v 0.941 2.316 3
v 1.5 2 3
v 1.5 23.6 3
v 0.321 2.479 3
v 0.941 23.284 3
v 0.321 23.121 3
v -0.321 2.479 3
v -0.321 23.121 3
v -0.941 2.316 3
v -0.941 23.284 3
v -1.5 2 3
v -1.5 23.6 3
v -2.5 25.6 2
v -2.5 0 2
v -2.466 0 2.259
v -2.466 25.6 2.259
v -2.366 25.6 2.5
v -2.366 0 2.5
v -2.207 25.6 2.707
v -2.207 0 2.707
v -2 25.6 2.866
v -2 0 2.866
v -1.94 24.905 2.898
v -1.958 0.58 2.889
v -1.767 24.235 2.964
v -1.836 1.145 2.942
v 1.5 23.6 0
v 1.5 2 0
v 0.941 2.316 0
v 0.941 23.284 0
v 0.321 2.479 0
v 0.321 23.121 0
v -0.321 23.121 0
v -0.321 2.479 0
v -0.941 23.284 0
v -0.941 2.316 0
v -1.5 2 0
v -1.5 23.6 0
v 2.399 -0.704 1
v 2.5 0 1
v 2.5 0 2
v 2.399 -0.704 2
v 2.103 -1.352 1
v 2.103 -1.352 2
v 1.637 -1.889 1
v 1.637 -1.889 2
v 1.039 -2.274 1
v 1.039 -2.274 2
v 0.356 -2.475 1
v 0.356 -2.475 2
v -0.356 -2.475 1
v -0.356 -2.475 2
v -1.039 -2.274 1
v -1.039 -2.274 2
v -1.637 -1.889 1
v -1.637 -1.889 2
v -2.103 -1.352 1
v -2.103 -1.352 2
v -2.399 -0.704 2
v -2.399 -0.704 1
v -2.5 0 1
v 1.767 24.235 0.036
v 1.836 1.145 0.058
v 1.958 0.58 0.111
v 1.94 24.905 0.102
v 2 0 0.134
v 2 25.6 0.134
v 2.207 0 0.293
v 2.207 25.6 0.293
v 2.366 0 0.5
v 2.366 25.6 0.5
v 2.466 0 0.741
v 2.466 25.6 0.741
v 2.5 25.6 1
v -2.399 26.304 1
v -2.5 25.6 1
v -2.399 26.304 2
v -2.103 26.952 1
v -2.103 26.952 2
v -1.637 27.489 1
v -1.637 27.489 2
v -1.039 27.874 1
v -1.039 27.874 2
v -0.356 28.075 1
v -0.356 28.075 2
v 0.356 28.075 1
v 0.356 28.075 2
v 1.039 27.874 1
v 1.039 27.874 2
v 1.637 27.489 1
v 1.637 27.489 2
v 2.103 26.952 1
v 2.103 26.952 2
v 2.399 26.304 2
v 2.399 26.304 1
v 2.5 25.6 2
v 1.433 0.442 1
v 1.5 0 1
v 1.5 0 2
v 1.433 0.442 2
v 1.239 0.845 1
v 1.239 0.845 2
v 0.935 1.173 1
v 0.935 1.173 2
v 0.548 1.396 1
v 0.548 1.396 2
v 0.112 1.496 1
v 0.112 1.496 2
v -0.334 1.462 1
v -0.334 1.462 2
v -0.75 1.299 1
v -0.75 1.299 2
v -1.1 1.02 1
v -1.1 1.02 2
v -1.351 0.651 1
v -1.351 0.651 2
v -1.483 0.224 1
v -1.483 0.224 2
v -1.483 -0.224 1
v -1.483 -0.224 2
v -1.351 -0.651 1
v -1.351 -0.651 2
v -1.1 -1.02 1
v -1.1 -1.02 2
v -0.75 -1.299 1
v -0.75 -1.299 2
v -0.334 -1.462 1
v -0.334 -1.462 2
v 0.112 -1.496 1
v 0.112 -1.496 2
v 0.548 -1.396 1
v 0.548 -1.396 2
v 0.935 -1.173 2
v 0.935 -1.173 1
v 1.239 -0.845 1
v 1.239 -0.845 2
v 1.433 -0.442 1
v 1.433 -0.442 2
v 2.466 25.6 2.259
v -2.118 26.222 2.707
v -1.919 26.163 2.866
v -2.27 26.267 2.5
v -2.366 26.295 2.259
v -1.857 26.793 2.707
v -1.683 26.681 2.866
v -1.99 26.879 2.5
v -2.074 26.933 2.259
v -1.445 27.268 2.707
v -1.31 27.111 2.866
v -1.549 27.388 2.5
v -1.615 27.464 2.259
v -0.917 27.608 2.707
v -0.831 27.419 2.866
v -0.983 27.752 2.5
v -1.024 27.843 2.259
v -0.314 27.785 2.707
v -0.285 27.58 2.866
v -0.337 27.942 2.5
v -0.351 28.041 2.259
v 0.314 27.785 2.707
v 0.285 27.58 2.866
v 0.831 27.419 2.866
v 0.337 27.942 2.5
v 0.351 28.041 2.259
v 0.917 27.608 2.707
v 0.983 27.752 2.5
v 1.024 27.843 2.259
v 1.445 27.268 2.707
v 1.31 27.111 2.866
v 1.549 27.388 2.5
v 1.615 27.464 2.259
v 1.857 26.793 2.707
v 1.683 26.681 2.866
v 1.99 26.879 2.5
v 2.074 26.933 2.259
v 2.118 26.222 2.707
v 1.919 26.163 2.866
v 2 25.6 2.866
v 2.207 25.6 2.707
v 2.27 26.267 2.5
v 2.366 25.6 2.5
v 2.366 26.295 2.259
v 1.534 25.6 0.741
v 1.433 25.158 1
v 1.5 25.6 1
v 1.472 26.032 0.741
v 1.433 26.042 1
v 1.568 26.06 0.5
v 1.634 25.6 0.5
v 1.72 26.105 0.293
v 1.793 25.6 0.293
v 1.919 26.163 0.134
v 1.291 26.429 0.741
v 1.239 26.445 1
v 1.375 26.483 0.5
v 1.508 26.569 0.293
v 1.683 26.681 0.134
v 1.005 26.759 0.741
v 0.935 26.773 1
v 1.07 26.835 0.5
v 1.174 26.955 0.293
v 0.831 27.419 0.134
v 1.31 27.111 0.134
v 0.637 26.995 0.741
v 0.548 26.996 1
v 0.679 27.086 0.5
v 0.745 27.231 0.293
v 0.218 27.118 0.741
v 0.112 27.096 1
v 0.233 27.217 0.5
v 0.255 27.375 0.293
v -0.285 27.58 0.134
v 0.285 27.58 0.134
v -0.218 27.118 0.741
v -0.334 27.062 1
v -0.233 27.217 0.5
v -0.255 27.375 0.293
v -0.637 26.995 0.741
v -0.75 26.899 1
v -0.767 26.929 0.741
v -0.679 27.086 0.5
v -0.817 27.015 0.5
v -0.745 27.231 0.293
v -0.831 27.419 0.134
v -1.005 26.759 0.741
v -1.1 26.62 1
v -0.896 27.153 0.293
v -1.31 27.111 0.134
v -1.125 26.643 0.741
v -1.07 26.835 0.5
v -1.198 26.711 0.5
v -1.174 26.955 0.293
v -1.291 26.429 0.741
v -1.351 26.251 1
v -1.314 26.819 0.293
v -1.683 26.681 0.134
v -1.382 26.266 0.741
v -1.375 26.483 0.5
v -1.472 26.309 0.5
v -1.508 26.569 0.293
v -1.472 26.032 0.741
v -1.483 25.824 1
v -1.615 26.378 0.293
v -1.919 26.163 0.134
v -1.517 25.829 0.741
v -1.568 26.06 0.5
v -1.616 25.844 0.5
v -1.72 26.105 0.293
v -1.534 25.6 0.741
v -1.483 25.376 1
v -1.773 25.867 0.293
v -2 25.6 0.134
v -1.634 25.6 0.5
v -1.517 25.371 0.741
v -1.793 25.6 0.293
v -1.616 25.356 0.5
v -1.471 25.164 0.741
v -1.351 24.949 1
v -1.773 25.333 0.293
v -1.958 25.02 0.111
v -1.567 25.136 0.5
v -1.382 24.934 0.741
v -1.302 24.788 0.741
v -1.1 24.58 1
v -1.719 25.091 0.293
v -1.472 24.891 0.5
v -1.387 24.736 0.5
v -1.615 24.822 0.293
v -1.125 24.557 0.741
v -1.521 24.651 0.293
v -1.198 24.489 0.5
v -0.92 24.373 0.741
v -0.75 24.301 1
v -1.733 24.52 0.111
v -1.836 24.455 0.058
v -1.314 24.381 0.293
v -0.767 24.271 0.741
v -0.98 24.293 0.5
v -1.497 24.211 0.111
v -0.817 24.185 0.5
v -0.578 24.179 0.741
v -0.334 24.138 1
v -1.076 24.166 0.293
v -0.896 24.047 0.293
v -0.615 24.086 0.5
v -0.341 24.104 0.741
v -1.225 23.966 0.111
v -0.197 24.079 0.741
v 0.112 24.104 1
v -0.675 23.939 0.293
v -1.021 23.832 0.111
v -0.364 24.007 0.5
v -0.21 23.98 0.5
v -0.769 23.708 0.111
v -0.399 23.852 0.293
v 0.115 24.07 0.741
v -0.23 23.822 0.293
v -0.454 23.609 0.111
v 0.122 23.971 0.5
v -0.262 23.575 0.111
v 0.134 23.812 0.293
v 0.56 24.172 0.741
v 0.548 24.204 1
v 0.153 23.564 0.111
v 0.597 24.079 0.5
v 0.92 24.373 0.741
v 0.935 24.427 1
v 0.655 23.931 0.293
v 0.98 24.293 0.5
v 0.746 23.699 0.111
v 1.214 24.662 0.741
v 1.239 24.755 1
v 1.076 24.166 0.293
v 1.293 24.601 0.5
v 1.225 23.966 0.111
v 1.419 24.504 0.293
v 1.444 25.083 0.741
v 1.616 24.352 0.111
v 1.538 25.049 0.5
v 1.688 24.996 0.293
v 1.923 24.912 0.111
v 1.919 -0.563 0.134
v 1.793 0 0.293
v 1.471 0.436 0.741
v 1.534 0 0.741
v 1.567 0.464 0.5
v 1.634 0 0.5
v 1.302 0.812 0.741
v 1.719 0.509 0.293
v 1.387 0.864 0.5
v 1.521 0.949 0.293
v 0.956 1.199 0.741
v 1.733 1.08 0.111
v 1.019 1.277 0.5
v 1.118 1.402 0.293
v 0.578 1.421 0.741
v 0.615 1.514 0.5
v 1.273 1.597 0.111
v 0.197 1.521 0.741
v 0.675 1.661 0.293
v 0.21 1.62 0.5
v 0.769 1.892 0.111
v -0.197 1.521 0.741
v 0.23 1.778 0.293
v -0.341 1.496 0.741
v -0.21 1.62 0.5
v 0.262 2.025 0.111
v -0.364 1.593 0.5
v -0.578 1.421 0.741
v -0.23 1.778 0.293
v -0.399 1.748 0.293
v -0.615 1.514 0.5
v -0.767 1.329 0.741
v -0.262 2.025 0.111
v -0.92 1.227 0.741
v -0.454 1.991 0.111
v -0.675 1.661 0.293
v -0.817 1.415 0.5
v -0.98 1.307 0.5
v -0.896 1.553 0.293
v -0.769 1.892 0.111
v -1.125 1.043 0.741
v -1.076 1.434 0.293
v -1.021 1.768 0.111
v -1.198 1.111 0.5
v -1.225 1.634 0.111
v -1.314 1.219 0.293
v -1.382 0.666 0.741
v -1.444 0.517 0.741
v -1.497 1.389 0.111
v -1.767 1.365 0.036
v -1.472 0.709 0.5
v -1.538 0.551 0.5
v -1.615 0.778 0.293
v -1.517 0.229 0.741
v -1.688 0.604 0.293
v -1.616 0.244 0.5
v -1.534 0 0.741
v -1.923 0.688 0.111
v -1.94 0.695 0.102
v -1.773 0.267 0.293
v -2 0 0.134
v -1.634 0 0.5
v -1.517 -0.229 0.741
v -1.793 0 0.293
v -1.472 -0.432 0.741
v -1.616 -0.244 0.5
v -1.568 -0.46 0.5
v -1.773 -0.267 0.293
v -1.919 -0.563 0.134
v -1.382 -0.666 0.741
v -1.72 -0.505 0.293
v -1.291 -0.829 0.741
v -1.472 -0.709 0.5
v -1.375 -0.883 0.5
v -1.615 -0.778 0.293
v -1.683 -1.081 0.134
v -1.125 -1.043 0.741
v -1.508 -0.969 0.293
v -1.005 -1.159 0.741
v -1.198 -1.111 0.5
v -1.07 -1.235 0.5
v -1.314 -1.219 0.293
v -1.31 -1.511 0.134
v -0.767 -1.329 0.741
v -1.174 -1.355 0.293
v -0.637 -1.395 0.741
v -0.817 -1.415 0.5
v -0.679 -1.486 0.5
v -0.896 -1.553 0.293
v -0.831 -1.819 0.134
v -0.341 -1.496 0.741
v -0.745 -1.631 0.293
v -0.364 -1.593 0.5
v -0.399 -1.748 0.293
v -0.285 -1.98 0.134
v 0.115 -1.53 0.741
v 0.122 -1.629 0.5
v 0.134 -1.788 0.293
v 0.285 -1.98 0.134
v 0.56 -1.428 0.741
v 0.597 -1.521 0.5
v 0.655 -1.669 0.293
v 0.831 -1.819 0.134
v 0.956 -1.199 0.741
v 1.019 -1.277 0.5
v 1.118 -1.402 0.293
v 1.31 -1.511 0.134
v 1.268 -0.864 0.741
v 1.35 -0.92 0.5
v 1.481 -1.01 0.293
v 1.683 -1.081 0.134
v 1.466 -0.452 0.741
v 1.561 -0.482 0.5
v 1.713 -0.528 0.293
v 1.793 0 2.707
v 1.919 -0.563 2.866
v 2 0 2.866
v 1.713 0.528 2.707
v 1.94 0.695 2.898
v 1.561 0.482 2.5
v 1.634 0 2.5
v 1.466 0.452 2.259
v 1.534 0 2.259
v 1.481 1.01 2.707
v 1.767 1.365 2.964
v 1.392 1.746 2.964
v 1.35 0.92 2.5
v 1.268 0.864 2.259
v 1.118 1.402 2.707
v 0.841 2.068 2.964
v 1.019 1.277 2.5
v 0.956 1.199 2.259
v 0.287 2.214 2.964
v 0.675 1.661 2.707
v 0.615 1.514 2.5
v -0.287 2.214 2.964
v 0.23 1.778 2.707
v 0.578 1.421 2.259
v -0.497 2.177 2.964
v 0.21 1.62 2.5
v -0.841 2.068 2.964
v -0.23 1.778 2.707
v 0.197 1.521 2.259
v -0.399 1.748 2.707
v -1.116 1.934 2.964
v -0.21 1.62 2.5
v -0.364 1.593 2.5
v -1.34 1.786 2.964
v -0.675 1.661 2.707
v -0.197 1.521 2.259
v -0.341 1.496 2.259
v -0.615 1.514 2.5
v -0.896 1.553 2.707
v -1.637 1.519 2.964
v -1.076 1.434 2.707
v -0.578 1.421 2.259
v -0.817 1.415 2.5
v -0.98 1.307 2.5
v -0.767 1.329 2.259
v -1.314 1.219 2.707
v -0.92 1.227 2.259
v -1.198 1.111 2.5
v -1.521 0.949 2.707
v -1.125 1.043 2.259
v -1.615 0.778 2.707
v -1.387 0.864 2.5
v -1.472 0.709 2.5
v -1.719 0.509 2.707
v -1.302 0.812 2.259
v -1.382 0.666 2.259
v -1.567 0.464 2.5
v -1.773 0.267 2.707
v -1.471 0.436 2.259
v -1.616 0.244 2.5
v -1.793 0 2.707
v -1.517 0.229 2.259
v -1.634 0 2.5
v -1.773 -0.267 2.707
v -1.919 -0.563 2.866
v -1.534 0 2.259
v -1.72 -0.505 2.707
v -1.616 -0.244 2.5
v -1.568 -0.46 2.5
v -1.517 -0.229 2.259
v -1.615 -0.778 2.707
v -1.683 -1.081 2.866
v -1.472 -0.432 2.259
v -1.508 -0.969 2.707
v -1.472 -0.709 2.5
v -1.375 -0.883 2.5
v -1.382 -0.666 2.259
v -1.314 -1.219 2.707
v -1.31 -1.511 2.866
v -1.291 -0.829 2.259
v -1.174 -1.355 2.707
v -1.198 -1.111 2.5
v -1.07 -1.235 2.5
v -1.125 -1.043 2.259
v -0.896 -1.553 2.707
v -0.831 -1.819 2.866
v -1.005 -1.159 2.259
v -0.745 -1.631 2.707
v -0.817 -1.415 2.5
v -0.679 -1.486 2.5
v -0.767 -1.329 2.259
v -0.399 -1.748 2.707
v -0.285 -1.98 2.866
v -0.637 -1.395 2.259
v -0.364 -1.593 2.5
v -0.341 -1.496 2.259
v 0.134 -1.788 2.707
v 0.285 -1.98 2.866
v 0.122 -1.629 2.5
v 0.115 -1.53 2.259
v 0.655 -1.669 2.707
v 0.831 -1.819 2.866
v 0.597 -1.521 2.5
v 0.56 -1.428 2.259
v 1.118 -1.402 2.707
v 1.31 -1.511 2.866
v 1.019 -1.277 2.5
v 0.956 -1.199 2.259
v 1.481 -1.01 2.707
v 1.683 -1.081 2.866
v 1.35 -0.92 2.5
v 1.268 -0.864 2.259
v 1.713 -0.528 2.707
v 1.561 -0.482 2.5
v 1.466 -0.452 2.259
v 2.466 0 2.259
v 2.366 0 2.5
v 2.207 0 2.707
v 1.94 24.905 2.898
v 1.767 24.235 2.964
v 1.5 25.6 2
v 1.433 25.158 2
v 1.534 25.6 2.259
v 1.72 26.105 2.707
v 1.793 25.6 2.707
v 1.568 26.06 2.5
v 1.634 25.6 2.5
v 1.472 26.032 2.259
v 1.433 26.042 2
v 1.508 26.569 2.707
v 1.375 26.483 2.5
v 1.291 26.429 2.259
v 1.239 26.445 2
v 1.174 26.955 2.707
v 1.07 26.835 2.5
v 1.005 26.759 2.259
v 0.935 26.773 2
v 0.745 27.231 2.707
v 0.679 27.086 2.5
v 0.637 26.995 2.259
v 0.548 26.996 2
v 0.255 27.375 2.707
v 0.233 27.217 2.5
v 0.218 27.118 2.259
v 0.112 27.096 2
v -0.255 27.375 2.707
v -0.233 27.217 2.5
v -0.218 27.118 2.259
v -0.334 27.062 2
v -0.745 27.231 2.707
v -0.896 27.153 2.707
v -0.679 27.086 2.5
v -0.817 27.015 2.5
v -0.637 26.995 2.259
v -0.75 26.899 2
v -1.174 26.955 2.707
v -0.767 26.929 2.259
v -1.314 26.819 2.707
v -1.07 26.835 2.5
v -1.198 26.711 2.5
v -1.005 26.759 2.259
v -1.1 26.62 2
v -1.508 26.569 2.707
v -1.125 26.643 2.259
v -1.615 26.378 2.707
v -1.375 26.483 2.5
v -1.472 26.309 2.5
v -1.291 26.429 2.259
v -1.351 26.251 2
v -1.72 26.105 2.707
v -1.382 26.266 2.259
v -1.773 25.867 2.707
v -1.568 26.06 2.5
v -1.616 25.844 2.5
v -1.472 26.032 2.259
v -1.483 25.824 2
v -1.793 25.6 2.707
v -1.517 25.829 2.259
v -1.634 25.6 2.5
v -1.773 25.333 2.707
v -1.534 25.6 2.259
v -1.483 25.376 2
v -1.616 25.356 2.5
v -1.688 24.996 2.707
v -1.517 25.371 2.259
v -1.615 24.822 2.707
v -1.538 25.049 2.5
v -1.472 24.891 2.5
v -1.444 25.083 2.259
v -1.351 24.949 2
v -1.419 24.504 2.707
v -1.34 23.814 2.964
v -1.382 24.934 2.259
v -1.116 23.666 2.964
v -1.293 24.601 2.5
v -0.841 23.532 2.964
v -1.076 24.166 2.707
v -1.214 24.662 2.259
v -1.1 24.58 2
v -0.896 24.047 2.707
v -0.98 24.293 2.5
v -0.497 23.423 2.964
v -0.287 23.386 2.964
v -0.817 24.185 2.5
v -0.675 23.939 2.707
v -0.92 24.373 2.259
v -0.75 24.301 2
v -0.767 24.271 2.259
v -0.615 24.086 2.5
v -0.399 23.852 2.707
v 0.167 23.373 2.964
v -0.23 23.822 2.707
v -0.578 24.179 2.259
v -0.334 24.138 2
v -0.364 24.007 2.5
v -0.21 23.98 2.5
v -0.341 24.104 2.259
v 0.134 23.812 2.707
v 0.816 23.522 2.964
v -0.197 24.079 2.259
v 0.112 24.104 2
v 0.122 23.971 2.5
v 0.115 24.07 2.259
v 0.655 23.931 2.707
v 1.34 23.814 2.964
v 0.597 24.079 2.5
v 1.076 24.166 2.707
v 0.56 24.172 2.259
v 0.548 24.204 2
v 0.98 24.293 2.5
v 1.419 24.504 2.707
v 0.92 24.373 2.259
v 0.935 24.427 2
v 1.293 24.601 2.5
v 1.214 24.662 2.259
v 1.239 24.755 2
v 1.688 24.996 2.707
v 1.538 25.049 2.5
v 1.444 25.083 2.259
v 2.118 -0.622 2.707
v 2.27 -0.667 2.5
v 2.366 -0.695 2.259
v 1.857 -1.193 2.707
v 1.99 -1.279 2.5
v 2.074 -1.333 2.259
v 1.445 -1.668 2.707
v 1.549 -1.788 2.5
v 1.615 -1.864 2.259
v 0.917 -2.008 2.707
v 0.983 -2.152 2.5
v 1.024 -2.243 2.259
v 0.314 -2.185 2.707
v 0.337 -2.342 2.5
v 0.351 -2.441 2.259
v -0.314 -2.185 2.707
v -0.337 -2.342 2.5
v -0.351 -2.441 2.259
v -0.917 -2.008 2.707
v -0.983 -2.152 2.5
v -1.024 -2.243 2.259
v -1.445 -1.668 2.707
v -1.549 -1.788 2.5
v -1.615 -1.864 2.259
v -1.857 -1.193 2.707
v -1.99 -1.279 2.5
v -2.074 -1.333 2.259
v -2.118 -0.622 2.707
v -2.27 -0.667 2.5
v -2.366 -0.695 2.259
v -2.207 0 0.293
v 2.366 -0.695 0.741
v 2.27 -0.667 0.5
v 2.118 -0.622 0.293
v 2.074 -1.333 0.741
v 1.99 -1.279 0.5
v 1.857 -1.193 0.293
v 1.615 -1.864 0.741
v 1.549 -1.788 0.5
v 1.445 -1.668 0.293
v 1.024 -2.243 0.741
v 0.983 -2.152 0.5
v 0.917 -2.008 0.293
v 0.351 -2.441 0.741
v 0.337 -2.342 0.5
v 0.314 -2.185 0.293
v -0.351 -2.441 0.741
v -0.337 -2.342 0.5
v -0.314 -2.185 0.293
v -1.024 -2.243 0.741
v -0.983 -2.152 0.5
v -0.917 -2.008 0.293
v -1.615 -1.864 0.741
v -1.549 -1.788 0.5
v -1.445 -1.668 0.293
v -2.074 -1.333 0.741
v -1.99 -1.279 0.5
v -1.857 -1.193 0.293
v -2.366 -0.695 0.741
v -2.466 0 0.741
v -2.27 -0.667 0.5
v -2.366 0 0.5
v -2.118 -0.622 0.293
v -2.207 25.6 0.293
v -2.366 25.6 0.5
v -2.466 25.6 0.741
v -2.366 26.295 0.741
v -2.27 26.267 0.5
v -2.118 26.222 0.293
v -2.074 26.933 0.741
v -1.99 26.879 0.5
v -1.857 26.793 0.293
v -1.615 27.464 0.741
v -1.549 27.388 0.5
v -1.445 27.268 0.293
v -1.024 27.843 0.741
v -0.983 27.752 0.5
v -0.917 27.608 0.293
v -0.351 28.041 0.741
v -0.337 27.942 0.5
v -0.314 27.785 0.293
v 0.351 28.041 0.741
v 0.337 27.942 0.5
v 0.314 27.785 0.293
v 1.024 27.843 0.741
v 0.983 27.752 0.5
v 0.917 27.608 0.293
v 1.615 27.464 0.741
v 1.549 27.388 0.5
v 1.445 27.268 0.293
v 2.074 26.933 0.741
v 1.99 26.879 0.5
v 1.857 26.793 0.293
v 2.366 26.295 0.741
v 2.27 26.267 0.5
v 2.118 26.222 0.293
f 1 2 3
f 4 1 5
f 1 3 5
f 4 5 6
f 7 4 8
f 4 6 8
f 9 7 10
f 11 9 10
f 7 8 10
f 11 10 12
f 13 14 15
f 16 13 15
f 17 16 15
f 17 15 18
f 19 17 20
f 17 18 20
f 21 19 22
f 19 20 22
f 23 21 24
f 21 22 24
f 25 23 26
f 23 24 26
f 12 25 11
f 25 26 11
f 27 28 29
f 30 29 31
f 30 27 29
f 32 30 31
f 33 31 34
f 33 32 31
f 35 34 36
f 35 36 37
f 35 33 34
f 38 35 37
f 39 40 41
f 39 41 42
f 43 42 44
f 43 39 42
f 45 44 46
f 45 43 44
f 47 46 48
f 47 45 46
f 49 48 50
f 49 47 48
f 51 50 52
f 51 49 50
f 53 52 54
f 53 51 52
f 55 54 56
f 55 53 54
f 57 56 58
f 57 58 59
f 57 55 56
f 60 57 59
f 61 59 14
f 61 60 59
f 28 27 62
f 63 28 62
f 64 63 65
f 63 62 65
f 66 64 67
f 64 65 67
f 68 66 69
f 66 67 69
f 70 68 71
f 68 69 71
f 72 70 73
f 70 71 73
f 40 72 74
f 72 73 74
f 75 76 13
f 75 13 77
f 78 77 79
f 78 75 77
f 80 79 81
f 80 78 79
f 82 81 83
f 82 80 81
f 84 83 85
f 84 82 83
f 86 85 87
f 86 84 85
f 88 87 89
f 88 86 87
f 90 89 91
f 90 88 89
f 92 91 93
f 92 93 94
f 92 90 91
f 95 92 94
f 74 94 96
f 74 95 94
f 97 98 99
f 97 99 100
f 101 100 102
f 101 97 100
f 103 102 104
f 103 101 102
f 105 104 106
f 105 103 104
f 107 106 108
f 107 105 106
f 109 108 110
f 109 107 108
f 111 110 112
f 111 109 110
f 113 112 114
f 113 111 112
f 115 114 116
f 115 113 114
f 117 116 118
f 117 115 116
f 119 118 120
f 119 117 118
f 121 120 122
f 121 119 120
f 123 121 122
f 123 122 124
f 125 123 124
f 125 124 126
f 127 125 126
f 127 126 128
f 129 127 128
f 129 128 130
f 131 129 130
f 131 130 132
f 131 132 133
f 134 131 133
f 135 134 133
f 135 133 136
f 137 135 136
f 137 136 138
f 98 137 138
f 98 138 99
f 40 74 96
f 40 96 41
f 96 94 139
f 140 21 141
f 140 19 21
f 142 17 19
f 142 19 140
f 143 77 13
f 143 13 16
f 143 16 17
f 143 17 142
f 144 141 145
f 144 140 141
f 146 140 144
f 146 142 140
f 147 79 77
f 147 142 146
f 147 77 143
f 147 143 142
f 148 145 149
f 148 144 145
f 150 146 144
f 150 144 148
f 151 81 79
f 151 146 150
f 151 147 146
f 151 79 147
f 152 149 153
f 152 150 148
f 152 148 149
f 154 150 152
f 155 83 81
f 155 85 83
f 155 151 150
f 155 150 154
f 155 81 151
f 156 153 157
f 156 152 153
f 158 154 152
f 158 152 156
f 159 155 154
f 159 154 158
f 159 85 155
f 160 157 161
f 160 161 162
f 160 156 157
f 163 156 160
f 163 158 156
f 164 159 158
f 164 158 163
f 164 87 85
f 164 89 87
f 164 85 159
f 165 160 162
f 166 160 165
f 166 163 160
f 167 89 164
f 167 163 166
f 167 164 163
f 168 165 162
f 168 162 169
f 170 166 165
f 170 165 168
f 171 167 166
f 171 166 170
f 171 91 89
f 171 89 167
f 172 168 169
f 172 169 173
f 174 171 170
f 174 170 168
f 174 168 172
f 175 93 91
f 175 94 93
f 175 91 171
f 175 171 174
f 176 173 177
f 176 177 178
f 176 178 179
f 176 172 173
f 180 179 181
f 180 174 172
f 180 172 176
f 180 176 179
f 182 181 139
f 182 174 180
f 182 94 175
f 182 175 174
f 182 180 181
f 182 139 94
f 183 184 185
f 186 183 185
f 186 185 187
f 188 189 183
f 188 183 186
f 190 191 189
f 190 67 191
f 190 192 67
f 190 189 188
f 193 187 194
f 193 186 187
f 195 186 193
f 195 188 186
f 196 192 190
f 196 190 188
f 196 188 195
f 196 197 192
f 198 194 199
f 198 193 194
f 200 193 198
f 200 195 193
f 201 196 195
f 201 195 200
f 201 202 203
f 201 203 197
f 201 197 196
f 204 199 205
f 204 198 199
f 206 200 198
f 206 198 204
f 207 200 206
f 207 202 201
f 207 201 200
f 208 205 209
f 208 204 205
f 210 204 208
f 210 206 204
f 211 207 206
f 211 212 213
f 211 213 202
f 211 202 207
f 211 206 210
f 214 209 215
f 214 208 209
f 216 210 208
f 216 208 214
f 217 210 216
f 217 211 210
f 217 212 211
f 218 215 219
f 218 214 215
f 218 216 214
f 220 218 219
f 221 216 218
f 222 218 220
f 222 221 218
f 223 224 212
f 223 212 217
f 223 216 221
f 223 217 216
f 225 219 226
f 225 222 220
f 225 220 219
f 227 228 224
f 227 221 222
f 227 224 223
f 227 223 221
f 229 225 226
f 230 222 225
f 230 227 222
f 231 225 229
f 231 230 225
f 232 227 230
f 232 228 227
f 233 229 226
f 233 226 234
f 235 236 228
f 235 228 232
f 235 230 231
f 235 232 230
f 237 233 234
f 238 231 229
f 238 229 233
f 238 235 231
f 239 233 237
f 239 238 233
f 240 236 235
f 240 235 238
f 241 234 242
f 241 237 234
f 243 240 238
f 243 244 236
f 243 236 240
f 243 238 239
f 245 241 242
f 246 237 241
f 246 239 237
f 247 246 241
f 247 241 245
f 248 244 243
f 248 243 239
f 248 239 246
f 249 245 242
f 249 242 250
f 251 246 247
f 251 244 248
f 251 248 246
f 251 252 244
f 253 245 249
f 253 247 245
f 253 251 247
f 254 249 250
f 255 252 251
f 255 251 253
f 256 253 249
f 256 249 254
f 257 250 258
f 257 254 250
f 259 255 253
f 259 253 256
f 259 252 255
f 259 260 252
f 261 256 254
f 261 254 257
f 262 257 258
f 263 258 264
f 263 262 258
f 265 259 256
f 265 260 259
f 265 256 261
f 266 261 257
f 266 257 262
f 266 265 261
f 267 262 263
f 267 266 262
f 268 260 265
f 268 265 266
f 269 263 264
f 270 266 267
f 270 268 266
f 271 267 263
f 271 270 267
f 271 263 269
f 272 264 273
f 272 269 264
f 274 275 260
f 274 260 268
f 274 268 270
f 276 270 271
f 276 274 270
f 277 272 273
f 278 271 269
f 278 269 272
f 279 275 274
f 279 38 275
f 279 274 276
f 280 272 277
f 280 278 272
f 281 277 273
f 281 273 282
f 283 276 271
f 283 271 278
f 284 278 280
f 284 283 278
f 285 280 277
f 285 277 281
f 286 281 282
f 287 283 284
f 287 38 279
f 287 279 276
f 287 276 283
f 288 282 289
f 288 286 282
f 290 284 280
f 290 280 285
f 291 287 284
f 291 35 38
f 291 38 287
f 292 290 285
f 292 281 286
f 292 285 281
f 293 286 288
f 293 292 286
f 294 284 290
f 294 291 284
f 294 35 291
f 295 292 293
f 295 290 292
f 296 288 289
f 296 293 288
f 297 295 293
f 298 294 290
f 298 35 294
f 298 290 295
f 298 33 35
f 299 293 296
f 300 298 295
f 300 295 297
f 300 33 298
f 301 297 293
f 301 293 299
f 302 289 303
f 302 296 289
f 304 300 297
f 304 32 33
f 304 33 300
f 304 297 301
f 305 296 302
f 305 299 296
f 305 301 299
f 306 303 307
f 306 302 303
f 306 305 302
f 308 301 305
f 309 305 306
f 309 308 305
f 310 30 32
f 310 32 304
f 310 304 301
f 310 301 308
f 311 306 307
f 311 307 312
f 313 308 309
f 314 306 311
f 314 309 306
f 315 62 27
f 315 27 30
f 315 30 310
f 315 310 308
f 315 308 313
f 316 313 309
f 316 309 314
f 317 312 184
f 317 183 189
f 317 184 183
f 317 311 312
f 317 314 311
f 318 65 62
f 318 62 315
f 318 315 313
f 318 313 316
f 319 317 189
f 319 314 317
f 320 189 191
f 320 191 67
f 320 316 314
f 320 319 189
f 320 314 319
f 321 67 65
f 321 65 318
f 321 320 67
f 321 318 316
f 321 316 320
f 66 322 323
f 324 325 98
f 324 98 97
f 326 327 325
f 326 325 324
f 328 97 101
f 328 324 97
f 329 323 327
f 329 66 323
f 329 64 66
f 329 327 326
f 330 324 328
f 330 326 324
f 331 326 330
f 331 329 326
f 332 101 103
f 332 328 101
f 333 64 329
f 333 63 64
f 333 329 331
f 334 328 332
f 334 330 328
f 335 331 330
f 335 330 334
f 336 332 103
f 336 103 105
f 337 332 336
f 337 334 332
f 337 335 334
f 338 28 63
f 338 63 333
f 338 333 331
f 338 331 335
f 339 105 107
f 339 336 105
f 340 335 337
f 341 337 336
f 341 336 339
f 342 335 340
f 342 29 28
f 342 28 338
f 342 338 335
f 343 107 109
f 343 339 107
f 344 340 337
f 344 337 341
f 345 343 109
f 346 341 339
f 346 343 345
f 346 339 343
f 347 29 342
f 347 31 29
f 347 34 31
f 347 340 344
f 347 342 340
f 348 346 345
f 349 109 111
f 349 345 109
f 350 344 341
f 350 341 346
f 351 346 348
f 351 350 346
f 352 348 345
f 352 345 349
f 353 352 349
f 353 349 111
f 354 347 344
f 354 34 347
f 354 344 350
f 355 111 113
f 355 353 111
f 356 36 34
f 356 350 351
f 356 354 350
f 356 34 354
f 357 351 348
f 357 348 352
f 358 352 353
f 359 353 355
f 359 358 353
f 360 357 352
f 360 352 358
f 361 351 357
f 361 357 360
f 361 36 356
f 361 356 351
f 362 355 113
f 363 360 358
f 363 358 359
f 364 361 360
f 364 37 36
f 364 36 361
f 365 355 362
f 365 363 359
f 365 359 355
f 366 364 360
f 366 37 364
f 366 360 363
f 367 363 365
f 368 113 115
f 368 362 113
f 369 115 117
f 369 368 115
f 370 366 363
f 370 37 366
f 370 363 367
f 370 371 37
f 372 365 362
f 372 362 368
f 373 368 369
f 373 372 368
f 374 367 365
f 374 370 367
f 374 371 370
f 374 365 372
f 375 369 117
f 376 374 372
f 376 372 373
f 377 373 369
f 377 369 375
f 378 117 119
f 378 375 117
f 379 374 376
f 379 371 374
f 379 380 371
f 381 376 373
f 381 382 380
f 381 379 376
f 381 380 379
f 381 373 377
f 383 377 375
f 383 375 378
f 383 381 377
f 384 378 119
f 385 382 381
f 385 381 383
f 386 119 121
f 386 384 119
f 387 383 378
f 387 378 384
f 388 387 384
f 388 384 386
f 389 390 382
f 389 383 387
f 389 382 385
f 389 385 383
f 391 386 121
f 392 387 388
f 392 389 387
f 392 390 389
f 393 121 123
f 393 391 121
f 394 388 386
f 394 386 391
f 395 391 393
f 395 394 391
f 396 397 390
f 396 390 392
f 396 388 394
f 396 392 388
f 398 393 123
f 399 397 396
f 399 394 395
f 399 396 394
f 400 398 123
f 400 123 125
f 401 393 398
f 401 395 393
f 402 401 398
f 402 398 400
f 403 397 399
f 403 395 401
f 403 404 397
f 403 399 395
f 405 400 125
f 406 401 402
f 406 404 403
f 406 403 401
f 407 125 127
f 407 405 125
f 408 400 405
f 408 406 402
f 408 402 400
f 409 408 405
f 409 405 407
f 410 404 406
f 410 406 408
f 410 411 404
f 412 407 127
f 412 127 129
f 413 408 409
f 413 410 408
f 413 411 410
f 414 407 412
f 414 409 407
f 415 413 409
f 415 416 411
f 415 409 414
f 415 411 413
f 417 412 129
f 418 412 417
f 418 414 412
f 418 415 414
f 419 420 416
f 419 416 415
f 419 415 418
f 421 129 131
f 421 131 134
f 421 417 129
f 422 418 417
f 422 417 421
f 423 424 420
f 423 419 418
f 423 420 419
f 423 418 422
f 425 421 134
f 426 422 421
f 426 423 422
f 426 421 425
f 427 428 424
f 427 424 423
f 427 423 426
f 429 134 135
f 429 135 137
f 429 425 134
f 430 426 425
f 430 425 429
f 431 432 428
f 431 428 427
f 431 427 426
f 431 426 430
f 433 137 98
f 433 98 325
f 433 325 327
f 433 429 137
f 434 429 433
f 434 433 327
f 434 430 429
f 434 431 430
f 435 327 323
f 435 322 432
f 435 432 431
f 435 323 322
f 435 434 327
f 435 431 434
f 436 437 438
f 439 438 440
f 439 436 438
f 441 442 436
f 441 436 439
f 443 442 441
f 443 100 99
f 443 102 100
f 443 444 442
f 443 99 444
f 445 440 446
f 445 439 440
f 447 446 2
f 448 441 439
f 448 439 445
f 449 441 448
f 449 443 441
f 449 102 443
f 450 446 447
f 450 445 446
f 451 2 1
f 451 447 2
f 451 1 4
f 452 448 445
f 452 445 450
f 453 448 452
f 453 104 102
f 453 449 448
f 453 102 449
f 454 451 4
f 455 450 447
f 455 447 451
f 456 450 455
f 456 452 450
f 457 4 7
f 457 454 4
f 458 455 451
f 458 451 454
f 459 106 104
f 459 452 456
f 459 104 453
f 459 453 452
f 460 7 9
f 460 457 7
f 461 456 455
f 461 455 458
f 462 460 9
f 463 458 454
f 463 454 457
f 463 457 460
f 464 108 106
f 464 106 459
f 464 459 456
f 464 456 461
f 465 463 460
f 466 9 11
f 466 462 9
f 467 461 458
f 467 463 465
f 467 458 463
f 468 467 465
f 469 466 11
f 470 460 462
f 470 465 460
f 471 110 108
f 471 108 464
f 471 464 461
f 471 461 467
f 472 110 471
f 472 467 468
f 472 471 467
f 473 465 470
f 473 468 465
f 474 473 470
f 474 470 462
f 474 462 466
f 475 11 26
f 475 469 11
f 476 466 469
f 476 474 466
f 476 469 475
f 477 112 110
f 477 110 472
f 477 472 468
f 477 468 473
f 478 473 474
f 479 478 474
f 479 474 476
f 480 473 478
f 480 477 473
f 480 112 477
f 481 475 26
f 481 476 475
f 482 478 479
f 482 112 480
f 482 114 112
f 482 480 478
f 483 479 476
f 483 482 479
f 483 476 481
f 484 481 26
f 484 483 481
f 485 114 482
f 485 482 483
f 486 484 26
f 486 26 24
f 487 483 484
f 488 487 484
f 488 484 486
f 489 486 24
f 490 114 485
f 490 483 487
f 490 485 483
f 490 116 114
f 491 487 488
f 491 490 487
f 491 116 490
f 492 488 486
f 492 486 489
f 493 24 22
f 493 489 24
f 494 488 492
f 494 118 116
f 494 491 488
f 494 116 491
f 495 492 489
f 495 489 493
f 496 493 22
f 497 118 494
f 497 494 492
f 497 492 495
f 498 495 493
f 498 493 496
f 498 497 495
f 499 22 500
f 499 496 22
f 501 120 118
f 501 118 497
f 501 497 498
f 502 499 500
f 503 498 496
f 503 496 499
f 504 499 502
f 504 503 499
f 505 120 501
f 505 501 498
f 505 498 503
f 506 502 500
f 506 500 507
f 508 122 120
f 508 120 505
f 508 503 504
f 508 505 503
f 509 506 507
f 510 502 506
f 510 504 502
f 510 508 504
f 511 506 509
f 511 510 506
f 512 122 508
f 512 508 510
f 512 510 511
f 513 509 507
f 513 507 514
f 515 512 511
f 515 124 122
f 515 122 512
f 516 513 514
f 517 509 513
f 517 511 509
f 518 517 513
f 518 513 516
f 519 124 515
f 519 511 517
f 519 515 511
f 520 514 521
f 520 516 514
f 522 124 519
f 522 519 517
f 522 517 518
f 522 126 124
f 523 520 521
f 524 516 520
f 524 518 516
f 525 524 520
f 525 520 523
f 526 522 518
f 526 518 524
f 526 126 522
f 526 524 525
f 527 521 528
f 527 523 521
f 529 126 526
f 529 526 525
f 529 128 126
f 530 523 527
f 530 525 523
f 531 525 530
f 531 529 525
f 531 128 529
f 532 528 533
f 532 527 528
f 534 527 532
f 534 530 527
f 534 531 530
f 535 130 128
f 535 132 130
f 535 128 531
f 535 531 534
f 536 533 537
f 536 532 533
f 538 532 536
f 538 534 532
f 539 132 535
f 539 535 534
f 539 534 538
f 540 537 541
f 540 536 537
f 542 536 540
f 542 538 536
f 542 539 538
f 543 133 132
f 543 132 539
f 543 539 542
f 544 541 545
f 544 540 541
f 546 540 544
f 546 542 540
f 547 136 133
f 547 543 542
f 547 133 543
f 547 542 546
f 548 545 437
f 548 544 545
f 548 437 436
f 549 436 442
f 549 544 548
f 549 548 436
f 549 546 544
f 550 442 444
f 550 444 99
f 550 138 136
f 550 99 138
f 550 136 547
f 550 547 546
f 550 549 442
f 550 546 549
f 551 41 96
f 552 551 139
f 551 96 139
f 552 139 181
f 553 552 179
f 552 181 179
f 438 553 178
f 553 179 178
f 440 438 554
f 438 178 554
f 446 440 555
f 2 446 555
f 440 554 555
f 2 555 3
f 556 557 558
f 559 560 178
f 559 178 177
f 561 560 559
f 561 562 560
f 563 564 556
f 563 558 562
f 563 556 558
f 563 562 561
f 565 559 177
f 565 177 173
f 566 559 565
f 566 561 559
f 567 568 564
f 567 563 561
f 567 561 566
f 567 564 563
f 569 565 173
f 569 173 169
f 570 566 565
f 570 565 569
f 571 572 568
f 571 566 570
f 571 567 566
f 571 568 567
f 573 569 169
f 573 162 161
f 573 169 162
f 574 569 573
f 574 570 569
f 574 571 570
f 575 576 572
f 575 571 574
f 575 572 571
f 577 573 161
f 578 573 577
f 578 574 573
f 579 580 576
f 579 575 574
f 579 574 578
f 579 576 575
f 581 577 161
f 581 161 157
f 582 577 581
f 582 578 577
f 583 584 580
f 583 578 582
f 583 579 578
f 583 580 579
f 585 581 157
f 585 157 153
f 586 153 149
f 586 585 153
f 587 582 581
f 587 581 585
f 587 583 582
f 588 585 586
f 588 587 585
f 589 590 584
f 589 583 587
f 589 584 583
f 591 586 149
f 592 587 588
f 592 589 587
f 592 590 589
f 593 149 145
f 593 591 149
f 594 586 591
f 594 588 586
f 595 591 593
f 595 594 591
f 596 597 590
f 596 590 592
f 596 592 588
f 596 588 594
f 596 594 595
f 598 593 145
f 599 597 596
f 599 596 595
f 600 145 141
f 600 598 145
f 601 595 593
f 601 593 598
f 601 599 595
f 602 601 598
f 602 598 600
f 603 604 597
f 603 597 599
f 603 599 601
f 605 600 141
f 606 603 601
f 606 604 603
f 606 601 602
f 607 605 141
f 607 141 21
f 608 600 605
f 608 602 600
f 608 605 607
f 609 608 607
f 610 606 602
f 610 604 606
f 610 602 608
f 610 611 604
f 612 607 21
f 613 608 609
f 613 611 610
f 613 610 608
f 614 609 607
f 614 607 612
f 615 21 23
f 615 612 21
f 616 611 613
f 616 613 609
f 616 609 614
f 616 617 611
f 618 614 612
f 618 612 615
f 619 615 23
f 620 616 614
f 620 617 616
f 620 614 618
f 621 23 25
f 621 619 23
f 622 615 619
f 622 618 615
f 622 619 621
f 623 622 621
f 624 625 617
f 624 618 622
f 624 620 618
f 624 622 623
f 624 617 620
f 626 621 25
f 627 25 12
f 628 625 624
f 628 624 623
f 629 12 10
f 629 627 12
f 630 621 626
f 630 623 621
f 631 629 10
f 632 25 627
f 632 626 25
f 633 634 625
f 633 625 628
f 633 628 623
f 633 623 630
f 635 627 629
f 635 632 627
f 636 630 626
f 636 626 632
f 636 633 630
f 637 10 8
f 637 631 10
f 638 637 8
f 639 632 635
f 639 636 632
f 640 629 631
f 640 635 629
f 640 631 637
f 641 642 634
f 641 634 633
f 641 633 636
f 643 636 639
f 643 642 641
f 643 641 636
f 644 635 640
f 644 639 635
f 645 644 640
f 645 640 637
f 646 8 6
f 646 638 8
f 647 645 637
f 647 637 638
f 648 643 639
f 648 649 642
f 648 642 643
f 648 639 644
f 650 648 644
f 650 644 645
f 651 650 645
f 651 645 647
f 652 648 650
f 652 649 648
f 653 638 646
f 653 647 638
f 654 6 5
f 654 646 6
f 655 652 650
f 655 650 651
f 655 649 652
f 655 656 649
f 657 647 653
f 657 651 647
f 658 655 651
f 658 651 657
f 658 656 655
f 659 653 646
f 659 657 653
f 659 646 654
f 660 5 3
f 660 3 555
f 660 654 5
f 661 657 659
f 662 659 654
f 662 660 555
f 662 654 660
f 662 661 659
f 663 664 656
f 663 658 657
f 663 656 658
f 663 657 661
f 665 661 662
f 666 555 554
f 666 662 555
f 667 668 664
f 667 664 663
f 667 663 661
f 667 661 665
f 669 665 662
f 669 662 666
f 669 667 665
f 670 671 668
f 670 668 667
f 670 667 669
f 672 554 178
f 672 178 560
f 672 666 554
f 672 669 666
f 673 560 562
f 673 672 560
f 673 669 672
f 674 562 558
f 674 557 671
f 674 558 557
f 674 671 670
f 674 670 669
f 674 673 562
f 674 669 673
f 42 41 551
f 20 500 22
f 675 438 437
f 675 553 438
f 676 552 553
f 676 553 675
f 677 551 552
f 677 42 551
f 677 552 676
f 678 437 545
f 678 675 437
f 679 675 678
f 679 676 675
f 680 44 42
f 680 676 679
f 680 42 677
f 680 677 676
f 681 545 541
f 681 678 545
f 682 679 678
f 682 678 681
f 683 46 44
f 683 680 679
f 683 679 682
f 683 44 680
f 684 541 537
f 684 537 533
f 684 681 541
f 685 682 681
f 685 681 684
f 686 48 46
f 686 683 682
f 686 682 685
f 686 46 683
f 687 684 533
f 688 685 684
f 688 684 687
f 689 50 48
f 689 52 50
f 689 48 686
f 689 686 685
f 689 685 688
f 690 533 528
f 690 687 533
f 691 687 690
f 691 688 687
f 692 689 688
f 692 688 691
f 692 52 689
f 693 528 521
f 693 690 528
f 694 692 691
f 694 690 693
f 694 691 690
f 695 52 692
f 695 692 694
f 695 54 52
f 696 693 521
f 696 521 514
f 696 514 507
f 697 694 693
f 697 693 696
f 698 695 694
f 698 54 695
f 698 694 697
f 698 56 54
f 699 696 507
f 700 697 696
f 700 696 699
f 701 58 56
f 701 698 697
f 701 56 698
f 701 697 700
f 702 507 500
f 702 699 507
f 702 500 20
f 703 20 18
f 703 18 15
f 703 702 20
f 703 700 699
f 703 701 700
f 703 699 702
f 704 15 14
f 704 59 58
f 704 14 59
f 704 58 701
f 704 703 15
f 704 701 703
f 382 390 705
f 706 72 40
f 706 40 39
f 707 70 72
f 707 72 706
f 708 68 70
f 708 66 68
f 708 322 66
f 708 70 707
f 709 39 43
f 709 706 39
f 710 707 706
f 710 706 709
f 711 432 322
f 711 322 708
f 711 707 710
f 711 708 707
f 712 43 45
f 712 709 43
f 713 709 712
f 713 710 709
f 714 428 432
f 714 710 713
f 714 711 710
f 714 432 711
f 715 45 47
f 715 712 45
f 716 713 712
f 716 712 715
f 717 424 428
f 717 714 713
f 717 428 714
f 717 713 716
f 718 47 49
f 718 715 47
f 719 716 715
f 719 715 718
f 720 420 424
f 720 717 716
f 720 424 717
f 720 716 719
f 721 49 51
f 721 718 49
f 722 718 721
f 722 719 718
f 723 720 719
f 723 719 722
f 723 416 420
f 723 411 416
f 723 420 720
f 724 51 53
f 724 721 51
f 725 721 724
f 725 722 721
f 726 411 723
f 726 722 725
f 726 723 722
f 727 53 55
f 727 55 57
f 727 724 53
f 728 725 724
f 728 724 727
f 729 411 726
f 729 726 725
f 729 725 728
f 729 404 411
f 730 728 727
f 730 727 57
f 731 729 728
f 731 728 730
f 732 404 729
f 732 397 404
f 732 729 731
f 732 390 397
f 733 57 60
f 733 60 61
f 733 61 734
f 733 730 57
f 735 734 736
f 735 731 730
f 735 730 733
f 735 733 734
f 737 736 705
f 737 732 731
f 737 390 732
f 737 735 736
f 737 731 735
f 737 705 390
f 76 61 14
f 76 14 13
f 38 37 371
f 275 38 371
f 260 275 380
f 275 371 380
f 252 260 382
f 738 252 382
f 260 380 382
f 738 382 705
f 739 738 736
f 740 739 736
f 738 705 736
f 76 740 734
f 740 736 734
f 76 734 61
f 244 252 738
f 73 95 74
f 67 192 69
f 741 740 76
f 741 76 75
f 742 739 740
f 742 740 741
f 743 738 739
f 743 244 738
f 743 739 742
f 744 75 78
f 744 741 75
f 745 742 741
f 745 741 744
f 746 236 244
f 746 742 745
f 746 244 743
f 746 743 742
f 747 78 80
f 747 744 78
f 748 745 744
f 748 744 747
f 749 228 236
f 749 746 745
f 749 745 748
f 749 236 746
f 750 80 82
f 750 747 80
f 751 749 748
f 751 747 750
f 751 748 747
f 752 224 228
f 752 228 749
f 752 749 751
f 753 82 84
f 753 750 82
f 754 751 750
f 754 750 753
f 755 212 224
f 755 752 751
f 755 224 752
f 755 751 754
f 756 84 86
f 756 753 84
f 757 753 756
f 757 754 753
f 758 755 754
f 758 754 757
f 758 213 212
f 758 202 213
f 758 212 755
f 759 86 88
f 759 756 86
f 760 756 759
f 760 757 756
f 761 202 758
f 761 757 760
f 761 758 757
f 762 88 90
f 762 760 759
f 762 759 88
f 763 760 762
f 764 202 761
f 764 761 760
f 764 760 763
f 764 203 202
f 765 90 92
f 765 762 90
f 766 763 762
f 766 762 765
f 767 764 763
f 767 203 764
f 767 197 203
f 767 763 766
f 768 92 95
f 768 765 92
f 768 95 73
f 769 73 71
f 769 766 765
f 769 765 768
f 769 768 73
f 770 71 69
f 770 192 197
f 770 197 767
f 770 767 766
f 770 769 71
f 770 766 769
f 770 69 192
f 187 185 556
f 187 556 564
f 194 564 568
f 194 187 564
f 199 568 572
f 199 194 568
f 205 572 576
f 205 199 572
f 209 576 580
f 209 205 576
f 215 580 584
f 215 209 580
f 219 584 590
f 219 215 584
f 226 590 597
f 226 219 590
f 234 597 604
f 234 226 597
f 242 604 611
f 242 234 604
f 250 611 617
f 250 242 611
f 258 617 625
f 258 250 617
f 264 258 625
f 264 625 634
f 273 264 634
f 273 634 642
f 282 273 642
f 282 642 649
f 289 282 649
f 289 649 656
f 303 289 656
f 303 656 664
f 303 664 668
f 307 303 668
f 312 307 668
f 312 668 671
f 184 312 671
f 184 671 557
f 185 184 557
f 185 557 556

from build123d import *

# Parameters (mm, degrees)
SKETCH1_R           = 1.5
BOSS_EXTRUDE1_DEPTH = 3
FILLET2_R           = 1


with BuildPart() as part:
    # Sketch1 → Boss-Extrude1 (new body)
    with BuildSketch(Plane.XY):
        with BuildLine():
            Line((-2.5, 0), (-2.5, 25.6))
            ThreePointArc((-2.5, 25.6), (0, 28.1), (2.5, 25.6))
            Line((2.5, 25.6), (2.5, 0))
            ThreePointArc((2.5, 0), (0, -2.5), (-2.5, 0))
        make_face()
        with Locations((0, 25.6)):
            Circle(SKETCH1_R, mode=Mode.SUBTRACT)
        Circle(SKETCH1_R, mode=Mode.SUBTRACT)
    extrude(amount=BOSS_EXTRUDE1_DEPTH)

    # Fillet2
    # the kernel refuses this fillet: 1 mm, written as the material it takes off along each edge
    with BuildSketch(Plane(origin=(0, 0, 3), x_dir=(1, 0, 0), z_dir=(0, 1, 0))) as fillet2_piece_1:
        with BuildLine():
            CenterArc((2.5 - FILLET2_R, FILLET2_R), FILLET2_R, 270, 90)
            Line((2.5 - FILLET2_R, 0), (2.5, 0))
            Line((2.5, 0), (2.5, FILLET2_R))
        make_face()
    revolve(axis=Axis((0, 0, 3), (0, 0, -1)), revolution_arc=180, mode=Mode.SUBTRACT)
    with BuildSketch(Plane(origin=(0, 0, 0), x_dir=(1, 0, 0), z_dir=(0, 1, 0))) as fillet2_piece_2:
        with BuildLine():
            CenterArc((2.5 - FILLET2_R, -FILLET2_R), FILLET2_R, 0, 90)
            Line((2.5 - FILLET2_R, 0), (2.5, 0))
            Line((2.5, 0), (2.5, -FILLET2_R))
        make_face()
    revolve(axis=Axis((0, 0, 0), (0, 0, -1)), revolution_arc=180, mode=Mode.SUBTRACT)
    with BuildSketch(Plane(origin=(2.5, 25.6, 3), x_dir=(0, 0, -1), z_dir=(0, -1, 0)), Plane(origin=(-2.5, 0, 3), x_dir=(0, 0, -1), z_dir=(0, 1, 0))) as fillet2_piece_3:
        with BuildLine():
            CenterArc((FILLET2_R, -FILLET2_R), FILLET2_R, 90, 90)
            Line((0, -FILLET2_R), (0, 0))
            Line((0, 0), (FILLET2_R, 0))
        make_face()
    extrude(amount=25.6, mode=Mode.SUBTRACT)
    with BuildSketch(Plane(origin=(2.5, 25.6, 0), x_dir=(0, 0, 1), z_dir=(0, -1, 0)), Plane(origin=(-2.5, 0, 0), x_dir=(0, 0, 1), z_dir=(0, 1, 0))) as fillet2_piece_4:
        with BuildLine():
            CenterArc((FILLET2_R, FILLET2_R), FILLET2_R, 180, 90)
            Line((0, FILLET2_R), (0, 0))
            Line((0, 0), (FILLET2_R, 0))
        make_face()
    extrude(amount=25.6, mode=Mode.SUBTRACT)
    with BuildSketch(Plane(origin=(0, 25.6, 3), x_dir=(-1, 0, 0), z_dir=(0, -1, 0))) as fillet2_piece_5:
        with BuildLine():
            CenterArc((2.5 - FILLET2_R, FILLET2_R), FILLET2_R, 270, 90)
            Line((2.5 - FILLET2_R, 0), (2.5, 0))
            Line((2.5, 0), (2.5, FILLET2_R))
        make_face()
    revolve(axis=Axis((0, 25.6, 3), (0, 0, -1)), revolution_arc=180, mode=Mode.SUBTRACT)
    with BuildSketch(Plane(origin=(0, 25.6, 0), x_dir=(-1, 0, 0), z_dir=(0, -1, 0))) as fillet2_piece_6:
        with BuildLine():
            CenterArc((2.5 - FILLET2_R, -FILLET2_R), FILLET2_R, 0, 90)
            Line((2.5 - FILLET2_R, 0), (2.5, 0))
            Line((2.5, 0), (2.5, -FILLET2_R))
        make_face()
    revolve(axis=Axis((0, 25.6, 0), (0, 0, -1)), revolution_arc=180, mode=Mode.SUBTRACT)
    with BuildSketch(Plane(origin=(0, 25.6, 0), x_dir=(1, 0, 0), z_dir=(0, -1, 0))) as fillet2_piece_7:
        with BuildLine():
            CenterArc((1.5 + FILLET2_R, FILLET2_R), FILLET2_R, 180, 90)
            Line((1.5 + FILLET2_R, 0), (1.5, 0))
            Line((1.5, 0), (1.5, FILLET2_R))
        make_face()
    revolve(axis=Axis((0, 25.6, 0), (0, 0, 1)), mode=Mode.SUBTRACT)
    with BuildSketch(Plane(origin=(0, 25.6, 3), x_dir=(1, 0, 0), z_dir=(0, -1, 0))) as fillet2_piece_8:
        with BuildLine():
            CenterArc((1.5 + FILLET2_R, -FILLET2_R), FILLET2_R, 90, 90)
            Line((1.5 + FILLET2_R, 0), (1.5, 0))
            Line((1.5, 0), (1.5, -FILLET2_R))
        make_face()
    revolve(axis=Axis((0, 25.6, 3), (0, 0, 1)), mode=Mode.SUBTRACT)
    with BuildSketch(Plane(origin=(0, 0, 0), x_dir=(1, 0, 0), z_dir=(0, -1, 0))) as fillet2_piece_9:
        with BuildLine():
            CenterArc((1.5 + FILLET2_R, FILLET2_R), FILLET2_R, 180, 90)
            Line((1.5 + FILLET2_R, 0), (1.5, 0))
            Line((1.5, 0), (1.5, FILLET2_R))
        make_face()
    revolve(axis=Axis((0, 0, 0), (0, 0, 1)), mode=Mode.SUBTRACT)
    with BuildSketch(Plane(origin=(0, 0, 3), x_dir=(1, 0, 0), z_dir=(0, -1, 0))) as fillet2_piece_10:
        with BuildLine():
            CenterArc((1.5 + FILLET2_R, -FILLET2_R), FILLET2_R, 90, 90)
            Line((1.5 + FILLET2_R, 0), (1.5, 0))
            Line((1.5, 0), (1.5, -FILLET2_R))
        make_face()
    revolve(axis=Axis((0, 0, 3), (0, 0, 1)), mode=Mode.SUBTRACT)


solid = part.part
